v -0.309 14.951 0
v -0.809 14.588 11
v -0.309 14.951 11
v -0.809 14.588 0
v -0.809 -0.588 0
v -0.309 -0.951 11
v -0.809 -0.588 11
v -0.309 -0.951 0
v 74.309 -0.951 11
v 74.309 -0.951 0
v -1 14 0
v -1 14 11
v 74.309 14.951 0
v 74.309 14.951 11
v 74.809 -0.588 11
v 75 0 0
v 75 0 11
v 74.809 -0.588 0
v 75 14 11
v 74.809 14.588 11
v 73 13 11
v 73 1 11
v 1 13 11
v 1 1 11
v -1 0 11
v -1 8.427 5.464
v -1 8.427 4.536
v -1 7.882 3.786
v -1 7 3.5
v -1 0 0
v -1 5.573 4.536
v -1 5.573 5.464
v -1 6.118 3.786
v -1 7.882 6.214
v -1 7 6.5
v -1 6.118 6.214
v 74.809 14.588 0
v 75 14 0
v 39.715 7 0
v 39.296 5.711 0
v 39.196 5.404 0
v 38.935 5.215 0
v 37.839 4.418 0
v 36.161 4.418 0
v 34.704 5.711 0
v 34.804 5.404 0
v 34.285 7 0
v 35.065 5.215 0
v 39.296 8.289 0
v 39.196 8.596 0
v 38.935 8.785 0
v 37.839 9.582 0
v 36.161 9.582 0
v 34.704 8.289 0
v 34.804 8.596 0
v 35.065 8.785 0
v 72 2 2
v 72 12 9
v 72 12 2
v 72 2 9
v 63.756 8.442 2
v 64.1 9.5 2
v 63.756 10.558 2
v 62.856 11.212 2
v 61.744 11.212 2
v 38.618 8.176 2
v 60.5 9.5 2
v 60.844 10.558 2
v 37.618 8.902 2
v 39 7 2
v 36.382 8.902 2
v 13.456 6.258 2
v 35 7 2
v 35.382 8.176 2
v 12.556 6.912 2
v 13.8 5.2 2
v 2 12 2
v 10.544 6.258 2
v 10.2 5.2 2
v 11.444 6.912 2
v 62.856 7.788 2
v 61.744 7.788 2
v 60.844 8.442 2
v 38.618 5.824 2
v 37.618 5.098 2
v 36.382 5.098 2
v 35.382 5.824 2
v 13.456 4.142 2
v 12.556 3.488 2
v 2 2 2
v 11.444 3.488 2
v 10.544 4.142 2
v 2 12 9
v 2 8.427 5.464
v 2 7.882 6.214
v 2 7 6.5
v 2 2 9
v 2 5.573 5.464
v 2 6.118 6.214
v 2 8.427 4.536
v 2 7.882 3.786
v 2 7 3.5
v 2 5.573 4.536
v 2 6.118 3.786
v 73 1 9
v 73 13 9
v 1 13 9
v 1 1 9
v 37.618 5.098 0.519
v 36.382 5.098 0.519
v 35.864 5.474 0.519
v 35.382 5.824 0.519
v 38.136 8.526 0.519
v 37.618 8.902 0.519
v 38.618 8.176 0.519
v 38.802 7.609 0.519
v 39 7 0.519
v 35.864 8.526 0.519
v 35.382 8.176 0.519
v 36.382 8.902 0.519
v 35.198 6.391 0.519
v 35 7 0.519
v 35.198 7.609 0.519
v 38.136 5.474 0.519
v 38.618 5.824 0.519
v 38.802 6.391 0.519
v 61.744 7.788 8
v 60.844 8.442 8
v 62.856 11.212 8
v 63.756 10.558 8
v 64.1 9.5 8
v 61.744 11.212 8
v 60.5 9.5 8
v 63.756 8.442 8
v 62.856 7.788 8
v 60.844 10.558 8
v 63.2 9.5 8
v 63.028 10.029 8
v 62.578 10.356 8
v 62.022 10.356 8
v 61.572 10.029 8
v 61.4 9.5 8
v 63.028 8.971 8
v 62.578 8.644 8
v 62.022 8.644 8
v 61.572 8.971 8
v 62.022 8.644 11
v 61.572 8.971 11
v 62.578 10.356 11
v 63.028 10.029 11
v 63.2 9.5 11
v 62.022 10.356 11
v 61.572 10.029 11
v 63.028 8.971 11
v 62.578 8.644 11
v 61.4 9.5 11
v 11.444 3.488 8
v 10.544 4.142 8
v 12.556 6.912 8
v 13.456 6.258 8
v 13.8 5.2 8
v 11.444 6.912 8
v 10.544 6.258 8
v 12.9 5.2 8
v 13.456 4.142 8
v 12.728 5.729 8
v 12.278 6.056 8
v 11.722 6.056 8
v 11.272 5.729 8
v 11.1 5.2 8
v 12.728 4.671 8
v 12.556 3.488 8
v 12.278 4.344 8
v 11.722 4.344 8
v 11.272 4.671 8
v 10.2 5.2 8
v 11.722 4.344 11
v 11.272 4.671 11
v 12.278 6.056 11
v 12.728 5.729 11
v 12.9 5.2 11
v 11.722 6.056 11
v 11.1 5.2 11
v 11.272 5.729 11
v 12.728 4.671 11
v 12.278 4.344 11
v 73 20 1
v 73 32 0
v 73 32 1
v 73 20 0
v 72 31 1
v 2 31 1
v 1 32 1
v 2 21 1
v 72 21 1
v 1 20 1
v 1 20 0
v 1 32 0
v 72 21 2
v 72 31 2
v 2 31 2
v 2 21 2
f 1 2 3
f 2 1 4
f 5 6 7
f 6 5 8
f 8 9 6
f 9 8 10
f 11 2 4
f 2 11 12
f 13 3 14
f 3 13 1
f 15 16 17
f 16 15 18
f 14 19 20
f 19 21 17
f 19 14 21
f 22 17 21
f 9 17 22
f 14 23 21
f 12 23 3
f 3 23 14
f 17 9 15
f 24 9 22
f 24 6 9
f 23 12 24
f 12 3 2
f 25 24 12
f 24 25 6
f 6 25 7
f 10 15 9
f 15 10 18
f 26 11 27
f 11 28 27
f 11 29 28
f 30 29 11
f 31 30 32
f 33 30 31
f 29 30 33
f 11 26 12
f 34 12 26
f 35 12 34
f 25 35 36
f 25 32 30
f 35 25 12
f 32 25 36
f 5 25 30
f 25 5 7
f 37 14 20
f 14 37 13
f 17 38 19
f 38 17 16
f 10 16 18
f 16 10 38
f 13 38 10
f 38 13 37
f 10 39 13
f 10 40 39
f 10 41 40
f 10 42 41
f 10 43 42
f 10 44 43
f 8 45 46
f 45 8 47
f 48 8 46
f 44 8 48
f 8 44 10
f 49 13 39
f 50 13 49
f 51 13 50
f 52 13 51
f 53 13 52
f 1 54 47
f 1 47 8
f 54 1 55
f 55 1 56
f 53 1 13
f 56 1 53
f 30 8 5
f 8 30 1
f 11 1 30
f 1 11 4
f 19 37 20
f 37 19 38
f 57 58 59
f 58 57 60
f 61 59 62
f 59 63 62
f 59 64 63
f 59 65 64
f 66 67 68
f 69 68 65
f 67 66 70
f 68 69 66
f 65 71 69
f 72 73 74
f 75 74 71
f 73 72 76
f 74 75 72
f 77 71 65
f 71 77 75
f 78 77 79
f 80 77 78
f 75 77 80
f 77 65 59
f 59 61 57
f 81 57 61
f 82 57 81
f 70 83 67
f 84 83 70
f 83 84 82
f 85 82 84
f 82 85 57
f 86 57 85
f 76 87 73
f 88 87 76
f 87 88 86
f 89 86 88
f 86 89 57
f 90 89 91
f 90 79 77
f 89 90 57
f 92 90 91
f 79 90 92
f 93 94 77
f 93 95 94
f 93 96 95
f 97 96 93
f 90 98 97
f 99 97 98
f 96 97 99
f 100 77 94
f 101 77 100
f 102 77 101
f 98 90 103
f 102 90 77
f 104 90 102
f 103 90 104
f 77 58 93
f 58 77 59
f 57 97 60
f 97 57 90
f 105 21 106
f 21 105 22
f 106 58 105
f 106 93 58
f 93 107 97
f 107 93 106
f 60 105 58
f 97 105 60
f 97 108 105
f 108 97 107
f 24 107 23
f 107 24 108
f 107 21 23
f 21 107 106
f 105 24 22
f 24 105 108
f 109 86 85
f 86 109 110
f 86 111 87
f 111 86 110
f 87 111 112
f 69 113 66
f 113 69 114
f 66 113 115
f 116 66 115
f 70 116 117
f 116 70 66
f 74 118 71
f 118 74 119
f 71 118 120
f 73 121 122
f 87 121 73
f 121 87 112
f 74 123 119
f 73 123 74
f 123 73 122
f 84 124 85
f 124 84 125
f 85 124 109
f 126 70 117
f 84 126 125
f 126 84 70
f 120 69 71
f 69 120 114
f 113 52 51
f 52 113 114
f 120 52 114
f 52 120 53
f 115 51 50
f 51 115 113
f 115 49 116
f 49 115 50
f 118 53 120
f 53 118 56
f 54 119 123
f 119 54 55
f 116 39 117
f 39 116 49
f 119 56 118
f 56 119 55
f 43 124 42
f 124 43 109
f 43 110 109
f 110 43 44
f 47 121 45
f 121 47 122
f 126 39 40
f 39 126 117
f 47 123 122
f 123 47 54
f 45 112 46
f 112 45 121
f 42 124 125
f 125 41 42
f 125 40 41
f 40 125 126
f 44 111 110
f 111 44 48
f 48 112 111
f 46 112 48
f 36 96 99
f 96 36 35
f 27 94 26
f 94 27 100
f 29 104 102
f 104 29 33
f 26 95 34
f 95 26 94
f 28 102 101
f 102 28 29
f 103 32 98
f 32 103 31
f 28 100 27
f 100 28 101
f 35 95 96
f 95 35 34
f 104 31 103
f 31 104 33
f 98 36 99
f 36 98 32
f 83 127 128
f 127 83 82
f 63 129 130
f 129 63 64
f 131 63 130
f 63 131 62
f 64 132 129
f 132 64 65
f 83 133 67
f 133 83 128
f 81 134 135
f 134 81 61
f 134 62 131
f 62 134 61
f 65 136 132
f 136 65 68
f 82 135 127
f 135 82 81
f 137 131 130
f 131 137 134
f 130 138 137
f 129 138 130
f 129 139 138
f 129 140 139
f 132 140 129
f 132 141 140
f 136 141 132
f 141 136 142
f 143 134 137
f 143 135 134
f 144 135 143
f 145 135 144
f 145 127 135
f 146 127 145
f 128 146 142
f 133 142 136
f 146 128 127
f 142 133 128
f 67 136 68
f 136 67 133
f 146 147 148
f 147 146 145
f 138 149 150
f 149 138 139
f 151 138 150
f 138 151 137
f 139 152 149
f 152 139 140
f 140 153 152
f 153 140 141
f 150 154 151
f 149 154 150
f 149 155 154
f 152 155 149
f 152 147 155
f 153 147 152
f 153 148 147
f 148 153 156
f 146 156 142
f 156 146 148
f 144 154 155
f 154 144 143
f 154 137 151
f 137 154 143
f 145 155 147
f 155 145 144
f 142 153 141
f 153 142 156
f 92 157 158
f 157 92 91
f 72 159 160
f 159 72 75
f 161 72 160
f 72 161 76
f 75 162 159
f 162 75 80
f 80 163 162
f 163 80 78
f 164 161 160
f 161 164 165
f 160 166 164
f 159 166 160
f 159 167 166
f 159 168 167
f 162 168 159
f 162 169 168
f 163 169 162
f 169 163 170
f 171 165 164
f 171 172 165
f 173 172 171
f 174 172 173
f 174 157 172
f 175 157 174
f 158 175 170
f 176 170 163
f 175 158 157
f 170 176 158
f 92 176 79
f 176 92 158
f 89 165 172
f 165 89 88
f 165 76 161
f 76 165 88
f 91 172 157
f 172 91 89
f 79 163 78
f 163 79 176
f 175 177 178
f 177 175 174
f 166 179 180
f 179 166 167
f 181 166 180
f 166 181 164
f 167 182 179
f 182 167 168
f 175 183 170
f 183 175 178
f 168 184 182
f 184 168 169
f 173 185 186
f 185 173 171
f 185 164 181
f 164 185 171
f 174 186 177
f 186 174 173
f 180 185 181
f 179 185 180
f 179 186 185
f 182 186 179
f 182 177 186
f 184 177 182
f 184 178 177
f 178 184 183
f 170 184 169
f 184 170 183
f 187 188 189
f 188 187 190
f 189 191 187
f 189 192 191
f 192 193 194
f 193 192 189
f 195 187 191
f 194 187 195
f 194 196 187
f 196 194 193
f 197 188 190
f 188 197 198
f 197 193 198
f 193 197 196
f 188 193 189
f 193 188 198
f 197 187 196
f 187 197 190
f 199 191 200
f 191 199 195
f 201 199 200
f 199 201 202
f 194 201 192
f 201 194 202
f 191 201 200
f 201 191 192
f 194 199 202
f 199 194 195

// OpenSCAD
/* Cam Enclosure for Cams saved from old Notebook Displays to use as 
normal USB Device 

Copyright (c) 2017 Michael Sauer
*/

/* [Basic] */

render_mode = 1; // [0:off, 1:on]

// Thickness of outer walls
wall_thickness = 2; // [1:0.1:4]
// Width dimension of your cam pcb
pcb_width = 70;  // [30:0.1:100]
// Height dimension of you cam pcb
pcb_height = 10; // [10:0.1:50]
// Thickness of your cam pcb including the cam sensor
pcb_thickness = 7; // [3:0.1:15]
// Finish of the enclosure (round edges)
enclosure_finish = 1; // [0:0.1:3]

// Offset of the cam hole from left side (normally half of pcb_width)
cam_hole_offset_left = pcb_width / 2; // [5:0.1:90] 
                                   
// Offset of the cam hole from top                                    
cam_hole_offset_top = pcb_height / 2 + wall_thickness; // [2:0.1:48]   
// Diameter of cam hole
cam_hole_diameter = 4; // [1:0.1:6]
// Finish of cam hole
cam_hole_finish = 0.8; // [0:0.1:2]
                      
// Side of cable hole                      
cable_hole_side = 0; // [0:left, 1:right]
// Diameter of cable hole
cable_hole_diameter = 3; // [1:0.1:6]

// Diamter of mount hole 1
mount1_diameter = 1.8; // [1:0.1:6]
// Offset 1 for hole base from left of pcb
mount1_offset_left = 60.3; // [5:0.1:90]
// Offset 1 for hole base from top of pcb
mount1_offset_top = 7.5; // [2:0.1:48]

// Diameter of mount hole 2 (mostly same as mount 1)
mount2_diameter = mount1_diameter; // [1:0.1:6]
// Offset 2 for hole base from left of pcb
mount2_offset_left = 10; // [5:0.1:90]
// Offset 2 for hole base from top of pcb
mount2_offset_top = 3.2; // [2:0.1:48]

/* [Hidden] */

// Circle resolution
$fn = render_mode? 10: 50;

/* Begin Model Code */
enclosure(); // Enclosure
translate([(wall_thickness / 2), pcb_height + 10, 0])
    cap(); // Cap

module enclosure() {
    difference() {
        // Main enclosure frame with rounded corners
        minkowski() {
            cube([pcb_width + (2 * wall_thickness), 
                  pcb_height + (2 * wall_thickness), 
                  pcb_thickness + wall_thickness]);
            cylinder(r=enclosure_finish,h=2);
        }
        // Inner cut
        translate([wall_thickness, wall_thickness, wall_thickness]) 
            cube([pcb_width, 
                  pcb_height, 
                  pcb_thickness + wall_thickness]); 
        
        // Bevel for cap
        translate([(wall_thickness / 2), 
                   (wall_thickness / 2), 
                   pcb_thickness + wall_thickness])
            cube([pcb_width + wall_thickness,
                  pcb_height + wall_thickness,
                  pcb_thickness]);

        // Camera hole
        translate([cam_hole_offset_left + wall_thickness, 
                   cam_hole_offset_top,
                   0])
            cylinder(h = pcb_thickness + wall_thickness, d = cam_hole_diameter); // hole
        
        translate([cam_hole_offset_left + wall_thickness,
                   pcb_thickness,
                   -3.2])
            sphere(d = (cam_hole_diameter * 2) + cam_hole_finish); // finish
            
        // Cable hole
        if (cable_hole_side == 0) { // Left side hole
            translate([-3,
                   pcb_thickness, 
                   (pcb_height / 2)])
                rotate([0,90,0])
                    cylinder(h = wall_thickness + 3, d = cable_hole_diameter);
        } else if (cable_hole_side == 1) {
            translate([pcb_width + (wall_thickness * 2)-3,
                   pcb_thickness, 
                   (pcb_height / 2)])
                rotate([0,90,0])
                    cylinder(h = wall_thickness + 3, d = cable_hole_diameter);
        } else {
            // No cable hole if out of constrain
        }
    }
    
    // Mounting cylinders
    // left
    translate([wall_thickness + mount1_offset_left, mount1_offset_top + wall_thickness, wall_thickness])
        cylinder(h = pcb_thickness - 1, d = mount1_diameter * 2);
    translate([wall_thickness + mount1_offset_left, mount1_offset_top + wall_thickness, wall_thickness + 1])
        cylinder(h = pcb_thickness + 1, d = mount1_diameter);
    
    // right
    translate([wall_thickness + mount2_offset_left, mount2_offset_top + wall_thickness, wall_thickness])
        cylinder(h = pcb_thickness - 1, d = mount2_diameter * 2);
    translate([wall_thickness + mount2_offset_left, mount2_offset_top + wall_thickness, wall_thickness + 1])
        cylinder(h = pcb_thickness + 1, d = mount2_diameter);
    
    
}

module cap() {
    difference() {
        union() {
            // Main cap plate
            cube([pcb_width + wall_thickness, 
                  pcb_height + wall_thickness, 
                  (wall_thickness / 2)]);
    
            // Leading plate for cap
            translate([(wall_thickness / 2), 
                       (wall_thickness / 2), 
                       (wall_thickness / 2)]) 
                    cube([pcb_width, 
                          pcb_height, 
                          (wall_thickness / 2)]); 
        }
    }
}
    
